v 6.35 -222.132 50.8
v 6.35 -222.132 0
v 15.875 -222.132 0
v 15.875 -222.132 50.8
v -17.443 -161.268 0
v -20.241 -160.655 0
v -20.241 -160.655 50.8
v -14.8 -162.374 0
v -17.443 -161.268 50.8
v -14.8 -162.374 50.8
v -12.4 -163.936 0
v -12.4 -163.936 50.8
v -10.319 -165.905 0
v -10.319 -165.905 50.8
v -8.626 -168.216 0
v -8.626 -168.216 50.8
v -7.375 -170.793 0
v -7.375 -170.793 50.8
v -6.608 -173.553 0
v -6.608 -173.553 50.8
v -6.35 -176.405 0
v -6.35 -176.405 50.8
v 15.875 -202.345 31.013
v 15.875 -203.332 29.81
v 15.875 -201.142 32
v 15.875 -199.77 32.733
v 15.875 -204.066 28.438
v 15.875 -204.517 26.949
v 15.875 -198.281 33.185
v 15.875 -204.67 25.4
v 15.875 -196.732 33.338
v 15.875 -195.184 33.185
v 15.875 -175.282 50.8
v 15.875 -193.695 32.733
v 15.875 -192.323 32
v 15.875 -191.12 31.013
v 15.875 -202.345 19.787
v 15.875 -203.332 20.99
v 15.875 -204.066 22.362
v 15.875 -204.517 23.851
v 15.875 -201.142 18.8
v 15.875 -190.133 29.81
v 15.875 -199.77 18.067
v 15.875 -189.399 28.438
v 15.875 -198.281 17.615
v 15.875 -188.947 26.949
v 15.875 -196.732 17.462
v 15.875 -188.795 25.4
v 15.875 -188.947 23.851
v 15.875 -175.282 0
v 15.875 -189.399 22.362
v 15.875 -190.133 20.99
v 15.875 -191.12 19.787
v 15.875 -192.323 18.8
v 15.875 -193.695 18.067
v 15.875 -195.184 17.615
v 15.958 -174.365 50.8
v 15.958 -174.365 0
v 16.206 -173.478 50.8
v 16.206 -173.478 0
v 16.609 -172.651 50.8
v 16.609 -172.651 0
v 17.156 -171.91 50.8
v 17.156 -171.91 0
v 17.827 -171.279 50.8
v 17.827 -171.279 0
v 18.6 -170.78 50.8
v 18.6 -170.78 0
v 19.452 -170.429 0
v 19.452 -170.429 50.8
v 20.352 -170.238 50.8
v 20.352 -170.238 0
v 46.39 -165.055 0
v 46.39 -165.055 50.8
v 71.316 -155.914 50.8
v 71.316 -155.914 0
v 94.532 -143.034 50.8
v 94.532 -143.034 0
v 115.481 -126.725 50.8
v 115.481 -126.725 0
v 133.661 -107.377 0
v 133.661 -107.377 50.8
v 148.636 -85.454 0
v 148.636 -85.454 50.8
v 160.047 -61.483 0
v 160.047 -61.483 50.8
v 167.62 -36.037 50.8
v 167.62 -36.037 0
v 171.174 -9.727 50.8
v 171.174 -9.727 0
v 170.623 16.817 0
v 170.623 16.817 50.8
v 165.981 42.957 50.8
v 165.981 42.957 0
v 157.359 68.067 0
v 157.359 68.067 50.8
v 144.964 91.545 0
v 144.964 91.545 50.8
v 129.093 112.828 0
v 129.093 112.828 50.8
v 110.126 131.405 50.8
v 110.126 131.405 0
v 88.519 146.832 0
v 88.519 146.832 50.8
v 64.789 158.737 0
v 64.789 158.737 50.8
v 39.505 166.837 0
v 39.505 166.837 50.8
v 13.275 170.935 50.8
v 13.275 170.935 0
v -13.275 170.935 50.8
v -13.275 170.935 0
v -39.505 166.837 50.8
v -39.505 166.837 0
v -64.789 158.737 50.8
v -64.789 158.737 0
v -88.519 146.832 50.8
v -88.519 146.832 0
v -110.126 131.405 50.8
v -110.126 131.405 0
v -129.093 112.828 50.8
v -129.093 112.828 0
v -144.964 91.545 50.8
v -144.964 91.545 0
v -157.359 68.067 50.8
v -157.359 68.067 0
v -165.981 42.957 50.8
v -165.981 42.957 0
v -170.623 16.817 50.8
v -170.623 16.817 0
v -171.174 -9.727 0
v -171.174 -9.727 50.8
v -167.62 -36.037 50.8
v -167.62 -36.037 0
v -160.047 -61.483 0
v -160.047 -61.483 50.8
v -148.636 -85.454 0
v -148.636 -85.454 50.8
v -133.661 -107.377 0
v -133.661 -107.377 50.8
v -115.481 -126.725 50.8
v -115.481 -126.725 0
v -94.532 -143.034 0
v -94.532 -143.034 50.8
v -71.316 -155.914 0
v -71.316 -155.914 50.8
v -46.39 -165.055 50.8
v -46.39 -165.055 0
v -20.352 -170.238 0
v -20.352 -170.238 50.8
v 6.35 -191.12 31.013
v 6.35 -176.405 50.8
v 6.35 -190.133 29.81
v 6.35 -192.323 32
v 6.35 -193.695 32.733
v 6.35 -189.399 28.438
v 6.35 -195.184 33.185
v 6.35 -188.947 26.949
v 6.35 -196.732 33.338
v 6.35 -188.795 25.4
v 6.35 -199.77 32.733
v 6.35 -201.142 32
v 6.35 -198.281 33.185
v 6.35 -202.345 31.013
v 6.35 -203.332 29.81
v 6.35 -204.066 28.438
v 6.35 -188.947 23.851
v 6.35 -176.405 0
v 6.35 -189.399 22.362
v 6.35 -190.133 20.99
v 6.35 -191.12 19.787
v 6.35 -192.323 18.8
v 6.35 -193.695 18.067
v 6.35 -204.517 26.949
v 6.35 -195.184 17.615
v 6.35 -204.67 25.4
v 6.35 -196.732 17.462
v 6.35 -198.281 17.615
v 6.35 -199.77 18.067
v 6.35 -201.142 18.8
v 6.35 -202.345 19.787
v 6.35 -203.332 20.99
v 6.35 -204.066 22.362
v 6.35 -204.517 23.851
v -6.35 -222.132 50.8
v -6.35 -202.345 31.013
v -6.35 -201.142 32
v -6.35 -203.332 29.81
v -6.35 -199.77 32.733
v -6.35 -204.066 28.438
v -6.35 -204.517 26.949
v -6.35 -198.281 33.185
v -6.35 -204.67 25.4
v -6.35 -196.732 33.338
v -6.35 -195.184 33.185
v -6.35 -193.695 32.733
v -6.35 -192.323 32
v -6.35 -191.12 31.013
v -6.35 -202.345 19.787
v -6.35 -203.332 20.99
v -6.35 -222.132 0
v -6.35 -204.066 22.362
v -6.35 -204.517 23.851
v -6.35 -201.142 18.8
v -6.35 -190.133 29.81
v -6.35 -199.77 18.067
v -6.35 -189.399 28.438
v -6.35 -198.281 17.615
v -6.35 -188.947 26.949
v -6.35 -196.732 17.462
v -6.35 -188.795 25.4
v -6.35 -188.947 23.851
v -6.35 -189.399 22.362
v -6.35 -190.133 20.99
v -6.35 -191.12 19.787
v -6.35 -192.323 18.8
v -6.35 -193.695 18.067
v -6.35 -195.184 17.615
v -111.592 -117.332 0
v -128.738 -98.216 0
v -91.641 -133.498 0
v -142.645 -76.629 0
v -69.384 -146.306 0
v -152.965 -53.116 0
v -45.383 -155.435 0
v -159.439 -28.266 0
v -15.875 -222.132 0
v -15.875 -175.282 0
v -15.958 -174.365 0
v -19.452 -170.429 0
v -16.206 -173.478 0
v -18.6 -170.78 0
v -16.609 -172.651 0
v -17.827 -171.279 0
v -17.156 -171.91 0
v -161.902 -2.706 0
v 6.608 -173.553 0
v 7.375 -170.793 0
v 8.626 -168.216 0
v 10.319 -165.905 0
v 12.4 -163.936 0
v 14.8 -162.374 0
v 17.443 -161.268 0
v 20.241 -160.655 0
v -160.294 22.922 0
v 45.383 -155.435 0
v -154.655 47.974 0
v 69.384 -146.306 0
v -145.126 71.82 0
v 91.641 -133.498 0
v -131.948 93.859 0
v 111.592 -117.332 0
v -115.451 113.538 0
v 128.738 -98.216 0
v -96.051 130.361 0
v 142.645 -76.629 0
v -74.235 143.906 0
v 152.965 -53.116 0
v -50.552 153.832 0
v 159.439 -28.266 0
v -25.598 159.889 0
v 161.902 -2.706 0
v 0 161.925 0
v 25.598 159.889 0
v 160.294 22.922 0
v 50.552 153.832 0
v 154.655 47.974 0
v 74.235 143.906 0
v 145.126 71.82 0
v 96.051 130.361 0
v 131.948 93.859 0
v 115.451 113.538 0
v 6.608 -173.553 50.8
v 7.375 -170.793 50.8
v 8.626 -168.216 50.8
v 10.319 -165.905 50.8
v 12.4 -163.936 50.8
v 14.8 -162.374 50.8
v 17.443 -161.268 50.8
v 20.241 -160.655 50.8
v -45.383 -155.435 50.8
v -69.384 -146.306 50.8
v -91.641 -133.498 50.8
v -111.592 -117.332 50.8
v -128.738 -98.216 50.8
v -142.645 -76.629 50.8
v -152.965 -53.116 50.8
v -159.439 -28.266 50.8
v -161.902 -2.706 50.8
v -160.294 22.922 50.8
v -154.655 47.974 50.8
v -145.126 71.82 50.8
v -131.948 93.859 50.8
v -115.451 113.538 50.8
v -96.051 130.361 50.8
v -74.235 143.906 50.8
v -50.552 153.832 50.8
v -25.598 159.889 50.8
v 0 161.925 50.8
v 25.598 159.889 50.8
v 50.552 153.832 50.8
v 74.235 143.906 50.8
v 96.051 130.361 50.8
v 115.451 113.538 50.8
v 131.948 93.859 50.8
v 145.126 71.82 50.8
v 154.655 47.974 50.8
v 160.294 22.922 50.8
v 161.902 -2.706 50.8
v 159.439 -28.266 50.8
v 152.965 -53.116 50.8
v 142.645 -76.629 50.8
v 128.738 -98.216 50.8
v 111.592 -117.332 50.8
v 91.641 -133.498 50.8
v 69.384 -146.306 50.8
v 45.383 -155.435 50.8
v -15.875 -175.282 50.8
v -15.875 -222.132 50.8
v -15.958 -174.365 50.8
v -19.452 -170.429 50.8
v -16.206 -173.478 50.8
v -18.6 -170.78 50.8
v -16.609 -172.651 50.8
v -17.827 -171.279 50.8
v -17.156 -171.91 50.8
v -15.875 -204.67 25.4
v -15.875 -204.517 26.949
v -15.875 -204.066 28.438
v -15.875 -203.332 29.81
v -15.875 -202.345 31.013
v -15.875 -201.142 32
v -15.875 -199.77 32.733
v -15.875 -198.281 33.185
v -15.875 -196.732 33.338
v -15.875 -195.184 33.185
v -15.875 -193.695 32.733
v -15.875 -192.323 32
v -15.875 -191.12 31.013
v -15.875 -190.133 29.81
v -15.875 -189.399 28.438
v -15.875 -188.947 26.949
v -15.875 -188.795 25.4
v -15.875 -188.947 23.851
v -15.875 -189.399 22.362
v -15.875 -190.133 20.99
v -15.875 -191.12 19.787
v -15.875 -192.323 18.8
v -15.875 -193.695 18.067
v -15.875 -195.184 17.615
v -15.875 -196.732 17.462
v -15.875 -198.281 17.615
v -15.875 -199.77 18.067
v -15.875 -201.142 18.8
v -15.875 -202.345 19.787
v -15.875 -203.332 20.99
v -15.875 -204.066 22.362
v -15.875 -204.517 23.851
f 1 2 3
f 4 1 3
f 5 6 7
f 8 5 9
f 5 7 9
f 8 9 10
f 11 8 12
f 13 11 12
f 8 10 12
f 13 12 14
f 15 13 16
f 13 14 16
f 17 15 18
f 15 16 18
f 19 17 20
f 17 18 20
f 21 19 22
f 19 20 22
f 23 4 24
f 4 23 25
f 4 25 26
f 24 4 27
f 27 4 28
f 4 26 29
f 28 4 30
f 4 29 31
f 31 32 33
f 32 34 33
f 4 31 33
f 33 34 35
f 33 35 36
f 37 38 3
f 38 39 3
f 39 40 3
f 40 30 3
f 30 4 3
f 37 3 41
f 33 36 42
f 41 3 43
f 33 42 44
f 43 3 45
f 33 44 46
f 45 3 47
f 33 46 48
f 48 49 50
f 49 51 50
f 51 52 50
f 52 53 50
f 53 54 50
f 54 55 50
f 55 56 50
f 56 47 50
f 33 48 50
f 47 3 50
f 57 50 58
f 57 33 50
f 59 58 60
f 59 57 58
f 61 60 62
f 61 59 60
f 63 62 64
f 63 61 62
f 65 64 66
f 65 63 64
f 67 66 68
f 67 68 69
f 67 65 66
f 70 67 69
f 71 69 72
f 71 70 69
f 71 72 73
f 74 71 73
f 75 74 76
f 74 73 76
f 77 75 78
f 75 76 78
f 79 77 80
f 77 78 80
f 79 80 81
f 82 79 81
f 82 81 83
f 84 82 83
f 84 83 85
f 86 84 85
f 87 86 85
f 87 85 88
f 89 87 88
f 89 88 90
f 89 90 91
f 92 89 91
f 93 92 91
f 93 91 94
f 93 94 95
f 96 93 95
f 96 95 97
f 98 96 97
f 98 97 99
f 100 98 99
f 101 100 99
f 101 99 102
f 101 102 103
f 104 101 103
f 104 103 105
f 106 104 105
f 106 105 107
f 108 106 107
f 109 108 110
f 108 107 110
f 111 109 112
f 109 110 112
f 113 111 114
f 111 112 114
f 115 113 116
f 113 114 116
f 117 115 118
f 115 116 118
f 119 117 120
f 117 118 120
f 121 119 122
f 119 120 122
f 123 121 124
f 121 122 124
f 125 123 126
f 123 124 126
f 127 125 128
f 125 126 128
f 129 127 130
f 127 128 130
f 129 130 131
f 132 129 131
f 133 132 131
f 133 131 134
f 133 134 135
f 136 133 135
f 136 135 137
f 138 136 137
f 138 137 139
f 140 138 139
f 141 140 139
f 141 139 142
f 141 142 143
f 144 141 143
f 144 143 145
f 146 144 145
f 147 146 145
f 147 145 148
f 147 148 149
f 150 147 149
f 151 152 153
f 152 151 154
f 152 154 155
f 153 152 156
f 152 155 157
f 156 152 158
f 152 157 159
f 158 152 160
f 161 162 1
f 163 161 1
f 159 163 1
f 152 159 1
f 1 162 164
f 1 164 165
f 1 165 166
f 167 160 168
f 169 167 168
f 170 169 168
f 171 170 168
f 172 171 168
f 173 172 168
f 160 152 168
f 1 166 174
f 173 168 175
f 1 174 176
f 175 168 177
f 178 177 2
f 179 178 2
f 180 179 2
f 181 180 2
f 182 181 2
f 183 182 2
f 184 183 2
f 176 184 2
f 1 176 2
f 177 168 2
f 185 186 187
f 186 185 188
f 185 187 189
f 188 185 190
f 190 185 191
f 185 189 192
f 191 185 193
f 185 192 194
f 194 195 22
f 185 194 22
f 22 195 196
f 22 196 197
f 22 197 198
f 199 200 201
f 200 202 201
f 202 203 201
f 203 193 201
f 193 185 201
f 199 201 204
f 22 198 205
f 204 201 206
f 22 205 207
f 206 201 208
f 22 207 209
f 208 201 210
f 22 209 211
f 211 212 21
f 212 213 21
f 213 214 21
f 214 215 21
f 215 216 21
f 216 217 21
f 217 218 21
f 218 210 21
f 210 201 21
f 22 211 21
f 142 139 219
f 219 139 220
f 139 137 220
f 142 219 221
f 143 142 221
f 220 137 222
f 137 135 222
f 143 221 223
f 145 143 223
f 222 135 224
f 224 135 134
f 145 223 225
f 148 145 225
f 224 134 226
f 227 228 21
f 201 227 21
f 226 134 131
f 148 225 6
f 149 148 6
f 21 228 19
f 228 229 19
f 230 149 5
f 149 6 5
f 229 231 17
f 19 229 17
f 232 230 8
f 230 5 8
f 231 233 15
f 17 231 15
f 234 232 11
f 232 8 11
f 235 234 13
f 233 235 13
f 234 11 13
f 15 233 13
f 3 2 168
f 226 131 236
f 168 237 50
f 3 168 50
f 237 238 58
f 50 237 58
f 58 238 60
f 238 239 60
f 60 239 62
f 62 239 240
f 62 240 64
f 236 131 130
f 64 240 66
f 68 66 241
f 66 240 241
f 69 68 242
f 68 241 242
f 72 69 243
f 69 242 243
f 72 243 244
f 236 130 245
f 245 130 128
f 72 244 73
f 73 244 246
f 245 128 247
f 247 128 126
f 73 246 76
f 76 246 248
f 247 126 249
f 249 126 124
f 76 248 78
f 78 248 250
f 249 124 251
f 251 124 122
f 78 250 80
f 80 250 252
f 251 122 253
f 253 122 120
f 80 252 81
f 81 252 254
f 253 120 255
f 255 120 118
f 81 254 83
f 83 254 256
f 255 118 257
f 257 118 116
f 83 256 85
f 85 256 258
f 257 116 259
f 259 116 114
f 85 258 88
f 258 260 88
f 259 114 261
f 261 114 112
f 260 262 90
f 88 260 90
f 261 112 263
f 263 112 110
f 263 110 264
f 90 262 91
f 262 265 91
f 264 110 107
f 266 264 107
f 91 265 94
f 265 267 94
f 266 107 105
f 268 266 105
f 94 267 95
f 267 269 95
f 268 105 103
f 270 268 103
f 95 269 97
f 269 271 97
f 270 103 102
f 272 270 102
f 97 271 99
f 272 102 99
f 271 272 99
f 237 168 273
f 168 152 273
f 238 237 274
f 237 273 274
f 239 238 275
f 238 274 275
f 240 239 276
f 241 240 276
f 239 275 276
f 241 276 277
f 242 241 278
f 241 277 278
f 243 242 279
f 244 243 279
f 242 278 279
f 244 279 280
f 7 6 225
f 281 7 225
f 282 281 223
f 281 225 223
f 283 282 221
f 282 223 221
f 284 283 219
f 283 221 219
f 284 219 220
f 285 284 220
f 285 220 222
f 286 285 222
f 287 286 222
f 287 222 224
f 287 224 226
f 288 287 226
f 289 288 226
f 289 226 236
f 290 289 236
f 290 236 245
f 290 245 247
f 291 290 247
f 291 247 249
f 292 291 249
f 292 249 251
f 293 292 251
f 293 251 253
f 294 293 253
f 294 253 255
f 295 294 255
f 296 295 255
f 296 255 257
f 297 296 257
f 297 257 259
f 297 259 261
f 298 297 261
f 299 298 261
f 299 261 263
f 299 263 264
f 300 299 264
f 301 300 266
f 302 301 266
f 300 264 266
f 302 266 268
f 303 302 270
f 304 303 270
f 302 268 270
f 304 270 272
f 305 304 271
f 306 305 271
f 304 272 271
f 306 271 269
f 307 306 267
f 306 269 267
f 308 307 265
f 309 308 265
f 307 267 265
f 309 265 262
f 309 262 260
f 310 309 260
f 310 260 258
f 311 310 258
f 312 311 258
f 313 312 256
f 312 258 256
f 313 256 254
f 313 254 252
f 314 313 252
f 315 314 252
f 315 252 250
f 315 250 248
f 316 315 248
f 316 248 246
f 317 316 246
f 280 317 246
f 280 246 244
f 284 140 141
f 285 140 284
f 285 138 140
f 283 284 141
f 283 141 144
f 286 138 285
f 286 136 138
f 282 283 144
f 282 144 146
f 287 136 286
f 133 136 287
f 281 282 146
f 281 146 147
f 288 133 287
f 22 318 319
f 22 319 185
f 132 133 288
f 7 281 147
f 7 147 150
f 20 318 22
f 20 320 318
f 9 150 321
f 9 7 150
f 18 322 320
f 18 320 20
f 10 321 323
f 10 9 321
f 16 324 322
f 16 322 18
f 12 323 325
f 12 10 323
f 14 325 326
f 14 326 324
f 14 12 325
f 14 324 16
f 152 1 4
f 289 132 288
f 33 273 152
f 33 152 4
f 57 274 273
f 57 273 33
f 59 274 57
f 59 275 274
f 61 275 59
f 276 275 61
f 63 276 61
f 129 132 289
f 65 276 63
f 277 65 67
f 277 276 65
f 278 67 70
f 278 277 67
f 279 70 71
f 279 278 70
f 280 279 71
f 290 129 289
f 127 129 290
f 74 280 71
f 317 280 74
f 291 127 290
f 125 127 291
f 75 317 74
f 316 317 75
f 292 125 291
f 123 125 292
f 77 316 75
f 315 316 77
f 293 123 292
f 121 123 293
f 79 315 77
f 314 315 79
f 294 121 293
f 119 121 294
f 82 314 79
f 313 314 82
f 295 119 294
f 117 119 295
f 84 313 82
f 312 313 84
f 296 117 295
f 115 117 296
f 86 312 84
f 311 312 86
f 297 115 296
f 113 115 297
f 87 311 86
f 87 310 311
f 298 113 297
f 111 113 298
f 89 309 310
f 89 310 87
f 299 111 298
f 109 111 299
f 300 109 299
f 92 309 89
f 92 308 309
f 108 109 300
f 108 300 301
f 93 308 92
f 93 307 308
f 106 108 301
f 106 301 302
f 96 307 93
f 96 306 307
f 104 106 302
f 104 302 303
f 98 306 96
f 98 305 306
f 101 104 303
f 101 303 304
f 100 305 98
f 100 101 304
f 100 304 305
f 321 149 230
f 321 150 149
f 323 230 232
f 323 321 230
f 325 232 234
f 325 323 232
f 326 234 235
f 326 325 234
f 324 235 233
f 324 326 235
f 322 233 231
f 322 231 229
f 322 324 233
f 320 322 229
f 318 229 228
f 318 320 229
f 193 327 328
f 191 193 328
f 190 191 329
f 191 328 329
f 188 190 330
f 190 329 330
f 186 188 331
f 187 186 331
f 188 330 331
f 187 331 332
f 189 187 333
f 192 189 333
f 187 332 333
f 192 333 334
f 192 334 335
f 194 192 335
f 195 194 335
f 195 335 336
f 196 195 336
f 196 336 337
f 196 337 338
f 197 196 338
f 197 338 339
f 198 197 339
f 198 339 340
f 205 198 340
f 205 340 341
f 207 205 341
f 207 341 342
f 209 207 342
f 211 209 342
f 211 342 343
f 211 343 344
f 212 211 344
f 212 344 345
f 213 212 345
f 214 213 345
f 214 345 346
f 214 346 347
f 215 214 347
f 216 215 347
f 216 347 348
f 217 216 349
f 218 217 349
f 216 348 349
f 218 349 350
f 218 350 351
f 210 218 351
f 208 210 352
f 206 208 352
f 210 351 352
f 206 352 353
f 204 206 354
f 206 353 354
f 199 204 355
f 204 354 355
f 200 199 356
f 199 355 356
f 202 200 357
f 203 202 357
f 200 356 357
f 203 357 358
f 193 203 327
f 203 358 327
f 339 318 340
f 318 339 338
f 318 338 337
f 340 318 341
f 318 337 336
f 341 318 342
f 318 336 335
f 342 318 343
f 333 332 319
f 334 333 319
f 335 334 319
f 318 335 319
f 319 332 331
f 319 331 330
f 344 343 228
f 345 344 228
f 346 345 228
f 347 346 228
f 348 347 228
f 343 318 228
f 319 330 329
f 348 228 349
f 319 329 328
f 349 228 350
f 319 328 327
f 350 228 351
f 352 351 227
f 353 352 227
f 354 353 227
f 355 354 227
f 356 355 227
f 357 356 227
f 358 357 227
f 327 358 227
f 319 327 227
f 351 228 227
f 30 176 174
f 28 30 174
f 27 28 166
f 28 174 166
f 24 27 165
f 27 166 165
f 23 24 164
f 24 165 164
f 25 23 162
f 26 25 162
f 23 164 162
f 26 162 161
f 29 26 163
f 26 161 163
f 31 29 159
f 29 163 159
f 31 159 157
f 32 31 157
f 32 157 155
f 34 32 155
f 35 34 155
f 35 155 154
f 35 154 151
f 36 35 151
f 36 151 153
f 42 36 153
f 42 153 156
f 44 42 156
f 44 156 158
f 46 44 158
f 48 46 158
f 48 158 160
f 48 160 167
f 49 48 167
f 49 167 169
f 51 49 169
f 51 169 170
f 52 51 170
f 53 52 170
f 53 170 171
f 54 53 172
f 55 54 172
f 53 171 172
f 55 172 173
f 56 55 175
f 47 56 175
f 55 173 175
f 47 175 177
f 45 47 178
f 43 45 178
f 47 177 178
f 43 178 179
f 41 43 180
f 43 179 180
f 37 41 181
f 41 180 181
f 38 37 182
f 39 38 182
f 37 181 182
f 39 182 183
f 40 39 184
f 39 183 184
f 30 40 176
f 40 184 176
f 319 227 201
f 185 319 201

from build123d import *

# Parameters (mm, degrees)
F1_DEPTH = 50.8
F2_R     = 5.08
F3_R     = 15.875
F4_R     = 7.9375
F5_DEPTH = 187.326


with BuildPart() as f1:
    # F0 (on Top) → F1 (new body)
    with BuildSketch(Plane.XY):
        with BuildLine():
            ThreePointArc((-6.35, -161.800442), (0, 161.925), (6.35, -161.800442))
            Line((6.35, -161.800442), (6.35, -171.332367))
            Line((6.35, -171.332367), (6.35, -222.132367))
            Line((6.35, -222.132367), (15.875, -222.132367))
            Line((15.875, -222.132367), (15.875, -170.713464))
            ThreePointArc((15.875, -170.713464), (0, 171.45), (-15.875, -170.713464))
            Line((-15.875, -170.713464), (-15.875, -222.132367))
            Line((-15.875, -222.132367), (-6.35, -222.132367))
            Line((-6.35, -222.132367), (-6.35, -171.332367))
            Line((-6.35, -171.332367), (-6.35, -161.800442))
        make_face()
    extrude(amount=F1_DEPTH)

    # F2
    f2_edges = [f1.edges().sort_by_distance(p)[0] for p in [
        (-15.875, -170.713464, 25.4),
        (15.875, -170.713464, 25.4),
    ]]
    fillet(f2_edges, radius=F2_R)

    # F3
    f3_edges = [f1.edges().sort_by_distance(p)[0] for p in [
        (-6.35, -161.800442, 25.4),
        (6.35, -161.800442, 25.4),
    ]]
    fillet(f3_edges, radius=F3_R)

    # F4 (on face) → F5 (cut, through all)
    with BuildSketch(Plane(origin=(-15.875, 0, 0), x_dir=(0, -1, 0), z_dir=(-1, 0, 0))):
        with Locations((196.732367, 25.4)):
            Circle(F4_R)
    extrude(amount=-F5_DEPTH, mode=Mode.SUBTRACT)


solid = f1.part
